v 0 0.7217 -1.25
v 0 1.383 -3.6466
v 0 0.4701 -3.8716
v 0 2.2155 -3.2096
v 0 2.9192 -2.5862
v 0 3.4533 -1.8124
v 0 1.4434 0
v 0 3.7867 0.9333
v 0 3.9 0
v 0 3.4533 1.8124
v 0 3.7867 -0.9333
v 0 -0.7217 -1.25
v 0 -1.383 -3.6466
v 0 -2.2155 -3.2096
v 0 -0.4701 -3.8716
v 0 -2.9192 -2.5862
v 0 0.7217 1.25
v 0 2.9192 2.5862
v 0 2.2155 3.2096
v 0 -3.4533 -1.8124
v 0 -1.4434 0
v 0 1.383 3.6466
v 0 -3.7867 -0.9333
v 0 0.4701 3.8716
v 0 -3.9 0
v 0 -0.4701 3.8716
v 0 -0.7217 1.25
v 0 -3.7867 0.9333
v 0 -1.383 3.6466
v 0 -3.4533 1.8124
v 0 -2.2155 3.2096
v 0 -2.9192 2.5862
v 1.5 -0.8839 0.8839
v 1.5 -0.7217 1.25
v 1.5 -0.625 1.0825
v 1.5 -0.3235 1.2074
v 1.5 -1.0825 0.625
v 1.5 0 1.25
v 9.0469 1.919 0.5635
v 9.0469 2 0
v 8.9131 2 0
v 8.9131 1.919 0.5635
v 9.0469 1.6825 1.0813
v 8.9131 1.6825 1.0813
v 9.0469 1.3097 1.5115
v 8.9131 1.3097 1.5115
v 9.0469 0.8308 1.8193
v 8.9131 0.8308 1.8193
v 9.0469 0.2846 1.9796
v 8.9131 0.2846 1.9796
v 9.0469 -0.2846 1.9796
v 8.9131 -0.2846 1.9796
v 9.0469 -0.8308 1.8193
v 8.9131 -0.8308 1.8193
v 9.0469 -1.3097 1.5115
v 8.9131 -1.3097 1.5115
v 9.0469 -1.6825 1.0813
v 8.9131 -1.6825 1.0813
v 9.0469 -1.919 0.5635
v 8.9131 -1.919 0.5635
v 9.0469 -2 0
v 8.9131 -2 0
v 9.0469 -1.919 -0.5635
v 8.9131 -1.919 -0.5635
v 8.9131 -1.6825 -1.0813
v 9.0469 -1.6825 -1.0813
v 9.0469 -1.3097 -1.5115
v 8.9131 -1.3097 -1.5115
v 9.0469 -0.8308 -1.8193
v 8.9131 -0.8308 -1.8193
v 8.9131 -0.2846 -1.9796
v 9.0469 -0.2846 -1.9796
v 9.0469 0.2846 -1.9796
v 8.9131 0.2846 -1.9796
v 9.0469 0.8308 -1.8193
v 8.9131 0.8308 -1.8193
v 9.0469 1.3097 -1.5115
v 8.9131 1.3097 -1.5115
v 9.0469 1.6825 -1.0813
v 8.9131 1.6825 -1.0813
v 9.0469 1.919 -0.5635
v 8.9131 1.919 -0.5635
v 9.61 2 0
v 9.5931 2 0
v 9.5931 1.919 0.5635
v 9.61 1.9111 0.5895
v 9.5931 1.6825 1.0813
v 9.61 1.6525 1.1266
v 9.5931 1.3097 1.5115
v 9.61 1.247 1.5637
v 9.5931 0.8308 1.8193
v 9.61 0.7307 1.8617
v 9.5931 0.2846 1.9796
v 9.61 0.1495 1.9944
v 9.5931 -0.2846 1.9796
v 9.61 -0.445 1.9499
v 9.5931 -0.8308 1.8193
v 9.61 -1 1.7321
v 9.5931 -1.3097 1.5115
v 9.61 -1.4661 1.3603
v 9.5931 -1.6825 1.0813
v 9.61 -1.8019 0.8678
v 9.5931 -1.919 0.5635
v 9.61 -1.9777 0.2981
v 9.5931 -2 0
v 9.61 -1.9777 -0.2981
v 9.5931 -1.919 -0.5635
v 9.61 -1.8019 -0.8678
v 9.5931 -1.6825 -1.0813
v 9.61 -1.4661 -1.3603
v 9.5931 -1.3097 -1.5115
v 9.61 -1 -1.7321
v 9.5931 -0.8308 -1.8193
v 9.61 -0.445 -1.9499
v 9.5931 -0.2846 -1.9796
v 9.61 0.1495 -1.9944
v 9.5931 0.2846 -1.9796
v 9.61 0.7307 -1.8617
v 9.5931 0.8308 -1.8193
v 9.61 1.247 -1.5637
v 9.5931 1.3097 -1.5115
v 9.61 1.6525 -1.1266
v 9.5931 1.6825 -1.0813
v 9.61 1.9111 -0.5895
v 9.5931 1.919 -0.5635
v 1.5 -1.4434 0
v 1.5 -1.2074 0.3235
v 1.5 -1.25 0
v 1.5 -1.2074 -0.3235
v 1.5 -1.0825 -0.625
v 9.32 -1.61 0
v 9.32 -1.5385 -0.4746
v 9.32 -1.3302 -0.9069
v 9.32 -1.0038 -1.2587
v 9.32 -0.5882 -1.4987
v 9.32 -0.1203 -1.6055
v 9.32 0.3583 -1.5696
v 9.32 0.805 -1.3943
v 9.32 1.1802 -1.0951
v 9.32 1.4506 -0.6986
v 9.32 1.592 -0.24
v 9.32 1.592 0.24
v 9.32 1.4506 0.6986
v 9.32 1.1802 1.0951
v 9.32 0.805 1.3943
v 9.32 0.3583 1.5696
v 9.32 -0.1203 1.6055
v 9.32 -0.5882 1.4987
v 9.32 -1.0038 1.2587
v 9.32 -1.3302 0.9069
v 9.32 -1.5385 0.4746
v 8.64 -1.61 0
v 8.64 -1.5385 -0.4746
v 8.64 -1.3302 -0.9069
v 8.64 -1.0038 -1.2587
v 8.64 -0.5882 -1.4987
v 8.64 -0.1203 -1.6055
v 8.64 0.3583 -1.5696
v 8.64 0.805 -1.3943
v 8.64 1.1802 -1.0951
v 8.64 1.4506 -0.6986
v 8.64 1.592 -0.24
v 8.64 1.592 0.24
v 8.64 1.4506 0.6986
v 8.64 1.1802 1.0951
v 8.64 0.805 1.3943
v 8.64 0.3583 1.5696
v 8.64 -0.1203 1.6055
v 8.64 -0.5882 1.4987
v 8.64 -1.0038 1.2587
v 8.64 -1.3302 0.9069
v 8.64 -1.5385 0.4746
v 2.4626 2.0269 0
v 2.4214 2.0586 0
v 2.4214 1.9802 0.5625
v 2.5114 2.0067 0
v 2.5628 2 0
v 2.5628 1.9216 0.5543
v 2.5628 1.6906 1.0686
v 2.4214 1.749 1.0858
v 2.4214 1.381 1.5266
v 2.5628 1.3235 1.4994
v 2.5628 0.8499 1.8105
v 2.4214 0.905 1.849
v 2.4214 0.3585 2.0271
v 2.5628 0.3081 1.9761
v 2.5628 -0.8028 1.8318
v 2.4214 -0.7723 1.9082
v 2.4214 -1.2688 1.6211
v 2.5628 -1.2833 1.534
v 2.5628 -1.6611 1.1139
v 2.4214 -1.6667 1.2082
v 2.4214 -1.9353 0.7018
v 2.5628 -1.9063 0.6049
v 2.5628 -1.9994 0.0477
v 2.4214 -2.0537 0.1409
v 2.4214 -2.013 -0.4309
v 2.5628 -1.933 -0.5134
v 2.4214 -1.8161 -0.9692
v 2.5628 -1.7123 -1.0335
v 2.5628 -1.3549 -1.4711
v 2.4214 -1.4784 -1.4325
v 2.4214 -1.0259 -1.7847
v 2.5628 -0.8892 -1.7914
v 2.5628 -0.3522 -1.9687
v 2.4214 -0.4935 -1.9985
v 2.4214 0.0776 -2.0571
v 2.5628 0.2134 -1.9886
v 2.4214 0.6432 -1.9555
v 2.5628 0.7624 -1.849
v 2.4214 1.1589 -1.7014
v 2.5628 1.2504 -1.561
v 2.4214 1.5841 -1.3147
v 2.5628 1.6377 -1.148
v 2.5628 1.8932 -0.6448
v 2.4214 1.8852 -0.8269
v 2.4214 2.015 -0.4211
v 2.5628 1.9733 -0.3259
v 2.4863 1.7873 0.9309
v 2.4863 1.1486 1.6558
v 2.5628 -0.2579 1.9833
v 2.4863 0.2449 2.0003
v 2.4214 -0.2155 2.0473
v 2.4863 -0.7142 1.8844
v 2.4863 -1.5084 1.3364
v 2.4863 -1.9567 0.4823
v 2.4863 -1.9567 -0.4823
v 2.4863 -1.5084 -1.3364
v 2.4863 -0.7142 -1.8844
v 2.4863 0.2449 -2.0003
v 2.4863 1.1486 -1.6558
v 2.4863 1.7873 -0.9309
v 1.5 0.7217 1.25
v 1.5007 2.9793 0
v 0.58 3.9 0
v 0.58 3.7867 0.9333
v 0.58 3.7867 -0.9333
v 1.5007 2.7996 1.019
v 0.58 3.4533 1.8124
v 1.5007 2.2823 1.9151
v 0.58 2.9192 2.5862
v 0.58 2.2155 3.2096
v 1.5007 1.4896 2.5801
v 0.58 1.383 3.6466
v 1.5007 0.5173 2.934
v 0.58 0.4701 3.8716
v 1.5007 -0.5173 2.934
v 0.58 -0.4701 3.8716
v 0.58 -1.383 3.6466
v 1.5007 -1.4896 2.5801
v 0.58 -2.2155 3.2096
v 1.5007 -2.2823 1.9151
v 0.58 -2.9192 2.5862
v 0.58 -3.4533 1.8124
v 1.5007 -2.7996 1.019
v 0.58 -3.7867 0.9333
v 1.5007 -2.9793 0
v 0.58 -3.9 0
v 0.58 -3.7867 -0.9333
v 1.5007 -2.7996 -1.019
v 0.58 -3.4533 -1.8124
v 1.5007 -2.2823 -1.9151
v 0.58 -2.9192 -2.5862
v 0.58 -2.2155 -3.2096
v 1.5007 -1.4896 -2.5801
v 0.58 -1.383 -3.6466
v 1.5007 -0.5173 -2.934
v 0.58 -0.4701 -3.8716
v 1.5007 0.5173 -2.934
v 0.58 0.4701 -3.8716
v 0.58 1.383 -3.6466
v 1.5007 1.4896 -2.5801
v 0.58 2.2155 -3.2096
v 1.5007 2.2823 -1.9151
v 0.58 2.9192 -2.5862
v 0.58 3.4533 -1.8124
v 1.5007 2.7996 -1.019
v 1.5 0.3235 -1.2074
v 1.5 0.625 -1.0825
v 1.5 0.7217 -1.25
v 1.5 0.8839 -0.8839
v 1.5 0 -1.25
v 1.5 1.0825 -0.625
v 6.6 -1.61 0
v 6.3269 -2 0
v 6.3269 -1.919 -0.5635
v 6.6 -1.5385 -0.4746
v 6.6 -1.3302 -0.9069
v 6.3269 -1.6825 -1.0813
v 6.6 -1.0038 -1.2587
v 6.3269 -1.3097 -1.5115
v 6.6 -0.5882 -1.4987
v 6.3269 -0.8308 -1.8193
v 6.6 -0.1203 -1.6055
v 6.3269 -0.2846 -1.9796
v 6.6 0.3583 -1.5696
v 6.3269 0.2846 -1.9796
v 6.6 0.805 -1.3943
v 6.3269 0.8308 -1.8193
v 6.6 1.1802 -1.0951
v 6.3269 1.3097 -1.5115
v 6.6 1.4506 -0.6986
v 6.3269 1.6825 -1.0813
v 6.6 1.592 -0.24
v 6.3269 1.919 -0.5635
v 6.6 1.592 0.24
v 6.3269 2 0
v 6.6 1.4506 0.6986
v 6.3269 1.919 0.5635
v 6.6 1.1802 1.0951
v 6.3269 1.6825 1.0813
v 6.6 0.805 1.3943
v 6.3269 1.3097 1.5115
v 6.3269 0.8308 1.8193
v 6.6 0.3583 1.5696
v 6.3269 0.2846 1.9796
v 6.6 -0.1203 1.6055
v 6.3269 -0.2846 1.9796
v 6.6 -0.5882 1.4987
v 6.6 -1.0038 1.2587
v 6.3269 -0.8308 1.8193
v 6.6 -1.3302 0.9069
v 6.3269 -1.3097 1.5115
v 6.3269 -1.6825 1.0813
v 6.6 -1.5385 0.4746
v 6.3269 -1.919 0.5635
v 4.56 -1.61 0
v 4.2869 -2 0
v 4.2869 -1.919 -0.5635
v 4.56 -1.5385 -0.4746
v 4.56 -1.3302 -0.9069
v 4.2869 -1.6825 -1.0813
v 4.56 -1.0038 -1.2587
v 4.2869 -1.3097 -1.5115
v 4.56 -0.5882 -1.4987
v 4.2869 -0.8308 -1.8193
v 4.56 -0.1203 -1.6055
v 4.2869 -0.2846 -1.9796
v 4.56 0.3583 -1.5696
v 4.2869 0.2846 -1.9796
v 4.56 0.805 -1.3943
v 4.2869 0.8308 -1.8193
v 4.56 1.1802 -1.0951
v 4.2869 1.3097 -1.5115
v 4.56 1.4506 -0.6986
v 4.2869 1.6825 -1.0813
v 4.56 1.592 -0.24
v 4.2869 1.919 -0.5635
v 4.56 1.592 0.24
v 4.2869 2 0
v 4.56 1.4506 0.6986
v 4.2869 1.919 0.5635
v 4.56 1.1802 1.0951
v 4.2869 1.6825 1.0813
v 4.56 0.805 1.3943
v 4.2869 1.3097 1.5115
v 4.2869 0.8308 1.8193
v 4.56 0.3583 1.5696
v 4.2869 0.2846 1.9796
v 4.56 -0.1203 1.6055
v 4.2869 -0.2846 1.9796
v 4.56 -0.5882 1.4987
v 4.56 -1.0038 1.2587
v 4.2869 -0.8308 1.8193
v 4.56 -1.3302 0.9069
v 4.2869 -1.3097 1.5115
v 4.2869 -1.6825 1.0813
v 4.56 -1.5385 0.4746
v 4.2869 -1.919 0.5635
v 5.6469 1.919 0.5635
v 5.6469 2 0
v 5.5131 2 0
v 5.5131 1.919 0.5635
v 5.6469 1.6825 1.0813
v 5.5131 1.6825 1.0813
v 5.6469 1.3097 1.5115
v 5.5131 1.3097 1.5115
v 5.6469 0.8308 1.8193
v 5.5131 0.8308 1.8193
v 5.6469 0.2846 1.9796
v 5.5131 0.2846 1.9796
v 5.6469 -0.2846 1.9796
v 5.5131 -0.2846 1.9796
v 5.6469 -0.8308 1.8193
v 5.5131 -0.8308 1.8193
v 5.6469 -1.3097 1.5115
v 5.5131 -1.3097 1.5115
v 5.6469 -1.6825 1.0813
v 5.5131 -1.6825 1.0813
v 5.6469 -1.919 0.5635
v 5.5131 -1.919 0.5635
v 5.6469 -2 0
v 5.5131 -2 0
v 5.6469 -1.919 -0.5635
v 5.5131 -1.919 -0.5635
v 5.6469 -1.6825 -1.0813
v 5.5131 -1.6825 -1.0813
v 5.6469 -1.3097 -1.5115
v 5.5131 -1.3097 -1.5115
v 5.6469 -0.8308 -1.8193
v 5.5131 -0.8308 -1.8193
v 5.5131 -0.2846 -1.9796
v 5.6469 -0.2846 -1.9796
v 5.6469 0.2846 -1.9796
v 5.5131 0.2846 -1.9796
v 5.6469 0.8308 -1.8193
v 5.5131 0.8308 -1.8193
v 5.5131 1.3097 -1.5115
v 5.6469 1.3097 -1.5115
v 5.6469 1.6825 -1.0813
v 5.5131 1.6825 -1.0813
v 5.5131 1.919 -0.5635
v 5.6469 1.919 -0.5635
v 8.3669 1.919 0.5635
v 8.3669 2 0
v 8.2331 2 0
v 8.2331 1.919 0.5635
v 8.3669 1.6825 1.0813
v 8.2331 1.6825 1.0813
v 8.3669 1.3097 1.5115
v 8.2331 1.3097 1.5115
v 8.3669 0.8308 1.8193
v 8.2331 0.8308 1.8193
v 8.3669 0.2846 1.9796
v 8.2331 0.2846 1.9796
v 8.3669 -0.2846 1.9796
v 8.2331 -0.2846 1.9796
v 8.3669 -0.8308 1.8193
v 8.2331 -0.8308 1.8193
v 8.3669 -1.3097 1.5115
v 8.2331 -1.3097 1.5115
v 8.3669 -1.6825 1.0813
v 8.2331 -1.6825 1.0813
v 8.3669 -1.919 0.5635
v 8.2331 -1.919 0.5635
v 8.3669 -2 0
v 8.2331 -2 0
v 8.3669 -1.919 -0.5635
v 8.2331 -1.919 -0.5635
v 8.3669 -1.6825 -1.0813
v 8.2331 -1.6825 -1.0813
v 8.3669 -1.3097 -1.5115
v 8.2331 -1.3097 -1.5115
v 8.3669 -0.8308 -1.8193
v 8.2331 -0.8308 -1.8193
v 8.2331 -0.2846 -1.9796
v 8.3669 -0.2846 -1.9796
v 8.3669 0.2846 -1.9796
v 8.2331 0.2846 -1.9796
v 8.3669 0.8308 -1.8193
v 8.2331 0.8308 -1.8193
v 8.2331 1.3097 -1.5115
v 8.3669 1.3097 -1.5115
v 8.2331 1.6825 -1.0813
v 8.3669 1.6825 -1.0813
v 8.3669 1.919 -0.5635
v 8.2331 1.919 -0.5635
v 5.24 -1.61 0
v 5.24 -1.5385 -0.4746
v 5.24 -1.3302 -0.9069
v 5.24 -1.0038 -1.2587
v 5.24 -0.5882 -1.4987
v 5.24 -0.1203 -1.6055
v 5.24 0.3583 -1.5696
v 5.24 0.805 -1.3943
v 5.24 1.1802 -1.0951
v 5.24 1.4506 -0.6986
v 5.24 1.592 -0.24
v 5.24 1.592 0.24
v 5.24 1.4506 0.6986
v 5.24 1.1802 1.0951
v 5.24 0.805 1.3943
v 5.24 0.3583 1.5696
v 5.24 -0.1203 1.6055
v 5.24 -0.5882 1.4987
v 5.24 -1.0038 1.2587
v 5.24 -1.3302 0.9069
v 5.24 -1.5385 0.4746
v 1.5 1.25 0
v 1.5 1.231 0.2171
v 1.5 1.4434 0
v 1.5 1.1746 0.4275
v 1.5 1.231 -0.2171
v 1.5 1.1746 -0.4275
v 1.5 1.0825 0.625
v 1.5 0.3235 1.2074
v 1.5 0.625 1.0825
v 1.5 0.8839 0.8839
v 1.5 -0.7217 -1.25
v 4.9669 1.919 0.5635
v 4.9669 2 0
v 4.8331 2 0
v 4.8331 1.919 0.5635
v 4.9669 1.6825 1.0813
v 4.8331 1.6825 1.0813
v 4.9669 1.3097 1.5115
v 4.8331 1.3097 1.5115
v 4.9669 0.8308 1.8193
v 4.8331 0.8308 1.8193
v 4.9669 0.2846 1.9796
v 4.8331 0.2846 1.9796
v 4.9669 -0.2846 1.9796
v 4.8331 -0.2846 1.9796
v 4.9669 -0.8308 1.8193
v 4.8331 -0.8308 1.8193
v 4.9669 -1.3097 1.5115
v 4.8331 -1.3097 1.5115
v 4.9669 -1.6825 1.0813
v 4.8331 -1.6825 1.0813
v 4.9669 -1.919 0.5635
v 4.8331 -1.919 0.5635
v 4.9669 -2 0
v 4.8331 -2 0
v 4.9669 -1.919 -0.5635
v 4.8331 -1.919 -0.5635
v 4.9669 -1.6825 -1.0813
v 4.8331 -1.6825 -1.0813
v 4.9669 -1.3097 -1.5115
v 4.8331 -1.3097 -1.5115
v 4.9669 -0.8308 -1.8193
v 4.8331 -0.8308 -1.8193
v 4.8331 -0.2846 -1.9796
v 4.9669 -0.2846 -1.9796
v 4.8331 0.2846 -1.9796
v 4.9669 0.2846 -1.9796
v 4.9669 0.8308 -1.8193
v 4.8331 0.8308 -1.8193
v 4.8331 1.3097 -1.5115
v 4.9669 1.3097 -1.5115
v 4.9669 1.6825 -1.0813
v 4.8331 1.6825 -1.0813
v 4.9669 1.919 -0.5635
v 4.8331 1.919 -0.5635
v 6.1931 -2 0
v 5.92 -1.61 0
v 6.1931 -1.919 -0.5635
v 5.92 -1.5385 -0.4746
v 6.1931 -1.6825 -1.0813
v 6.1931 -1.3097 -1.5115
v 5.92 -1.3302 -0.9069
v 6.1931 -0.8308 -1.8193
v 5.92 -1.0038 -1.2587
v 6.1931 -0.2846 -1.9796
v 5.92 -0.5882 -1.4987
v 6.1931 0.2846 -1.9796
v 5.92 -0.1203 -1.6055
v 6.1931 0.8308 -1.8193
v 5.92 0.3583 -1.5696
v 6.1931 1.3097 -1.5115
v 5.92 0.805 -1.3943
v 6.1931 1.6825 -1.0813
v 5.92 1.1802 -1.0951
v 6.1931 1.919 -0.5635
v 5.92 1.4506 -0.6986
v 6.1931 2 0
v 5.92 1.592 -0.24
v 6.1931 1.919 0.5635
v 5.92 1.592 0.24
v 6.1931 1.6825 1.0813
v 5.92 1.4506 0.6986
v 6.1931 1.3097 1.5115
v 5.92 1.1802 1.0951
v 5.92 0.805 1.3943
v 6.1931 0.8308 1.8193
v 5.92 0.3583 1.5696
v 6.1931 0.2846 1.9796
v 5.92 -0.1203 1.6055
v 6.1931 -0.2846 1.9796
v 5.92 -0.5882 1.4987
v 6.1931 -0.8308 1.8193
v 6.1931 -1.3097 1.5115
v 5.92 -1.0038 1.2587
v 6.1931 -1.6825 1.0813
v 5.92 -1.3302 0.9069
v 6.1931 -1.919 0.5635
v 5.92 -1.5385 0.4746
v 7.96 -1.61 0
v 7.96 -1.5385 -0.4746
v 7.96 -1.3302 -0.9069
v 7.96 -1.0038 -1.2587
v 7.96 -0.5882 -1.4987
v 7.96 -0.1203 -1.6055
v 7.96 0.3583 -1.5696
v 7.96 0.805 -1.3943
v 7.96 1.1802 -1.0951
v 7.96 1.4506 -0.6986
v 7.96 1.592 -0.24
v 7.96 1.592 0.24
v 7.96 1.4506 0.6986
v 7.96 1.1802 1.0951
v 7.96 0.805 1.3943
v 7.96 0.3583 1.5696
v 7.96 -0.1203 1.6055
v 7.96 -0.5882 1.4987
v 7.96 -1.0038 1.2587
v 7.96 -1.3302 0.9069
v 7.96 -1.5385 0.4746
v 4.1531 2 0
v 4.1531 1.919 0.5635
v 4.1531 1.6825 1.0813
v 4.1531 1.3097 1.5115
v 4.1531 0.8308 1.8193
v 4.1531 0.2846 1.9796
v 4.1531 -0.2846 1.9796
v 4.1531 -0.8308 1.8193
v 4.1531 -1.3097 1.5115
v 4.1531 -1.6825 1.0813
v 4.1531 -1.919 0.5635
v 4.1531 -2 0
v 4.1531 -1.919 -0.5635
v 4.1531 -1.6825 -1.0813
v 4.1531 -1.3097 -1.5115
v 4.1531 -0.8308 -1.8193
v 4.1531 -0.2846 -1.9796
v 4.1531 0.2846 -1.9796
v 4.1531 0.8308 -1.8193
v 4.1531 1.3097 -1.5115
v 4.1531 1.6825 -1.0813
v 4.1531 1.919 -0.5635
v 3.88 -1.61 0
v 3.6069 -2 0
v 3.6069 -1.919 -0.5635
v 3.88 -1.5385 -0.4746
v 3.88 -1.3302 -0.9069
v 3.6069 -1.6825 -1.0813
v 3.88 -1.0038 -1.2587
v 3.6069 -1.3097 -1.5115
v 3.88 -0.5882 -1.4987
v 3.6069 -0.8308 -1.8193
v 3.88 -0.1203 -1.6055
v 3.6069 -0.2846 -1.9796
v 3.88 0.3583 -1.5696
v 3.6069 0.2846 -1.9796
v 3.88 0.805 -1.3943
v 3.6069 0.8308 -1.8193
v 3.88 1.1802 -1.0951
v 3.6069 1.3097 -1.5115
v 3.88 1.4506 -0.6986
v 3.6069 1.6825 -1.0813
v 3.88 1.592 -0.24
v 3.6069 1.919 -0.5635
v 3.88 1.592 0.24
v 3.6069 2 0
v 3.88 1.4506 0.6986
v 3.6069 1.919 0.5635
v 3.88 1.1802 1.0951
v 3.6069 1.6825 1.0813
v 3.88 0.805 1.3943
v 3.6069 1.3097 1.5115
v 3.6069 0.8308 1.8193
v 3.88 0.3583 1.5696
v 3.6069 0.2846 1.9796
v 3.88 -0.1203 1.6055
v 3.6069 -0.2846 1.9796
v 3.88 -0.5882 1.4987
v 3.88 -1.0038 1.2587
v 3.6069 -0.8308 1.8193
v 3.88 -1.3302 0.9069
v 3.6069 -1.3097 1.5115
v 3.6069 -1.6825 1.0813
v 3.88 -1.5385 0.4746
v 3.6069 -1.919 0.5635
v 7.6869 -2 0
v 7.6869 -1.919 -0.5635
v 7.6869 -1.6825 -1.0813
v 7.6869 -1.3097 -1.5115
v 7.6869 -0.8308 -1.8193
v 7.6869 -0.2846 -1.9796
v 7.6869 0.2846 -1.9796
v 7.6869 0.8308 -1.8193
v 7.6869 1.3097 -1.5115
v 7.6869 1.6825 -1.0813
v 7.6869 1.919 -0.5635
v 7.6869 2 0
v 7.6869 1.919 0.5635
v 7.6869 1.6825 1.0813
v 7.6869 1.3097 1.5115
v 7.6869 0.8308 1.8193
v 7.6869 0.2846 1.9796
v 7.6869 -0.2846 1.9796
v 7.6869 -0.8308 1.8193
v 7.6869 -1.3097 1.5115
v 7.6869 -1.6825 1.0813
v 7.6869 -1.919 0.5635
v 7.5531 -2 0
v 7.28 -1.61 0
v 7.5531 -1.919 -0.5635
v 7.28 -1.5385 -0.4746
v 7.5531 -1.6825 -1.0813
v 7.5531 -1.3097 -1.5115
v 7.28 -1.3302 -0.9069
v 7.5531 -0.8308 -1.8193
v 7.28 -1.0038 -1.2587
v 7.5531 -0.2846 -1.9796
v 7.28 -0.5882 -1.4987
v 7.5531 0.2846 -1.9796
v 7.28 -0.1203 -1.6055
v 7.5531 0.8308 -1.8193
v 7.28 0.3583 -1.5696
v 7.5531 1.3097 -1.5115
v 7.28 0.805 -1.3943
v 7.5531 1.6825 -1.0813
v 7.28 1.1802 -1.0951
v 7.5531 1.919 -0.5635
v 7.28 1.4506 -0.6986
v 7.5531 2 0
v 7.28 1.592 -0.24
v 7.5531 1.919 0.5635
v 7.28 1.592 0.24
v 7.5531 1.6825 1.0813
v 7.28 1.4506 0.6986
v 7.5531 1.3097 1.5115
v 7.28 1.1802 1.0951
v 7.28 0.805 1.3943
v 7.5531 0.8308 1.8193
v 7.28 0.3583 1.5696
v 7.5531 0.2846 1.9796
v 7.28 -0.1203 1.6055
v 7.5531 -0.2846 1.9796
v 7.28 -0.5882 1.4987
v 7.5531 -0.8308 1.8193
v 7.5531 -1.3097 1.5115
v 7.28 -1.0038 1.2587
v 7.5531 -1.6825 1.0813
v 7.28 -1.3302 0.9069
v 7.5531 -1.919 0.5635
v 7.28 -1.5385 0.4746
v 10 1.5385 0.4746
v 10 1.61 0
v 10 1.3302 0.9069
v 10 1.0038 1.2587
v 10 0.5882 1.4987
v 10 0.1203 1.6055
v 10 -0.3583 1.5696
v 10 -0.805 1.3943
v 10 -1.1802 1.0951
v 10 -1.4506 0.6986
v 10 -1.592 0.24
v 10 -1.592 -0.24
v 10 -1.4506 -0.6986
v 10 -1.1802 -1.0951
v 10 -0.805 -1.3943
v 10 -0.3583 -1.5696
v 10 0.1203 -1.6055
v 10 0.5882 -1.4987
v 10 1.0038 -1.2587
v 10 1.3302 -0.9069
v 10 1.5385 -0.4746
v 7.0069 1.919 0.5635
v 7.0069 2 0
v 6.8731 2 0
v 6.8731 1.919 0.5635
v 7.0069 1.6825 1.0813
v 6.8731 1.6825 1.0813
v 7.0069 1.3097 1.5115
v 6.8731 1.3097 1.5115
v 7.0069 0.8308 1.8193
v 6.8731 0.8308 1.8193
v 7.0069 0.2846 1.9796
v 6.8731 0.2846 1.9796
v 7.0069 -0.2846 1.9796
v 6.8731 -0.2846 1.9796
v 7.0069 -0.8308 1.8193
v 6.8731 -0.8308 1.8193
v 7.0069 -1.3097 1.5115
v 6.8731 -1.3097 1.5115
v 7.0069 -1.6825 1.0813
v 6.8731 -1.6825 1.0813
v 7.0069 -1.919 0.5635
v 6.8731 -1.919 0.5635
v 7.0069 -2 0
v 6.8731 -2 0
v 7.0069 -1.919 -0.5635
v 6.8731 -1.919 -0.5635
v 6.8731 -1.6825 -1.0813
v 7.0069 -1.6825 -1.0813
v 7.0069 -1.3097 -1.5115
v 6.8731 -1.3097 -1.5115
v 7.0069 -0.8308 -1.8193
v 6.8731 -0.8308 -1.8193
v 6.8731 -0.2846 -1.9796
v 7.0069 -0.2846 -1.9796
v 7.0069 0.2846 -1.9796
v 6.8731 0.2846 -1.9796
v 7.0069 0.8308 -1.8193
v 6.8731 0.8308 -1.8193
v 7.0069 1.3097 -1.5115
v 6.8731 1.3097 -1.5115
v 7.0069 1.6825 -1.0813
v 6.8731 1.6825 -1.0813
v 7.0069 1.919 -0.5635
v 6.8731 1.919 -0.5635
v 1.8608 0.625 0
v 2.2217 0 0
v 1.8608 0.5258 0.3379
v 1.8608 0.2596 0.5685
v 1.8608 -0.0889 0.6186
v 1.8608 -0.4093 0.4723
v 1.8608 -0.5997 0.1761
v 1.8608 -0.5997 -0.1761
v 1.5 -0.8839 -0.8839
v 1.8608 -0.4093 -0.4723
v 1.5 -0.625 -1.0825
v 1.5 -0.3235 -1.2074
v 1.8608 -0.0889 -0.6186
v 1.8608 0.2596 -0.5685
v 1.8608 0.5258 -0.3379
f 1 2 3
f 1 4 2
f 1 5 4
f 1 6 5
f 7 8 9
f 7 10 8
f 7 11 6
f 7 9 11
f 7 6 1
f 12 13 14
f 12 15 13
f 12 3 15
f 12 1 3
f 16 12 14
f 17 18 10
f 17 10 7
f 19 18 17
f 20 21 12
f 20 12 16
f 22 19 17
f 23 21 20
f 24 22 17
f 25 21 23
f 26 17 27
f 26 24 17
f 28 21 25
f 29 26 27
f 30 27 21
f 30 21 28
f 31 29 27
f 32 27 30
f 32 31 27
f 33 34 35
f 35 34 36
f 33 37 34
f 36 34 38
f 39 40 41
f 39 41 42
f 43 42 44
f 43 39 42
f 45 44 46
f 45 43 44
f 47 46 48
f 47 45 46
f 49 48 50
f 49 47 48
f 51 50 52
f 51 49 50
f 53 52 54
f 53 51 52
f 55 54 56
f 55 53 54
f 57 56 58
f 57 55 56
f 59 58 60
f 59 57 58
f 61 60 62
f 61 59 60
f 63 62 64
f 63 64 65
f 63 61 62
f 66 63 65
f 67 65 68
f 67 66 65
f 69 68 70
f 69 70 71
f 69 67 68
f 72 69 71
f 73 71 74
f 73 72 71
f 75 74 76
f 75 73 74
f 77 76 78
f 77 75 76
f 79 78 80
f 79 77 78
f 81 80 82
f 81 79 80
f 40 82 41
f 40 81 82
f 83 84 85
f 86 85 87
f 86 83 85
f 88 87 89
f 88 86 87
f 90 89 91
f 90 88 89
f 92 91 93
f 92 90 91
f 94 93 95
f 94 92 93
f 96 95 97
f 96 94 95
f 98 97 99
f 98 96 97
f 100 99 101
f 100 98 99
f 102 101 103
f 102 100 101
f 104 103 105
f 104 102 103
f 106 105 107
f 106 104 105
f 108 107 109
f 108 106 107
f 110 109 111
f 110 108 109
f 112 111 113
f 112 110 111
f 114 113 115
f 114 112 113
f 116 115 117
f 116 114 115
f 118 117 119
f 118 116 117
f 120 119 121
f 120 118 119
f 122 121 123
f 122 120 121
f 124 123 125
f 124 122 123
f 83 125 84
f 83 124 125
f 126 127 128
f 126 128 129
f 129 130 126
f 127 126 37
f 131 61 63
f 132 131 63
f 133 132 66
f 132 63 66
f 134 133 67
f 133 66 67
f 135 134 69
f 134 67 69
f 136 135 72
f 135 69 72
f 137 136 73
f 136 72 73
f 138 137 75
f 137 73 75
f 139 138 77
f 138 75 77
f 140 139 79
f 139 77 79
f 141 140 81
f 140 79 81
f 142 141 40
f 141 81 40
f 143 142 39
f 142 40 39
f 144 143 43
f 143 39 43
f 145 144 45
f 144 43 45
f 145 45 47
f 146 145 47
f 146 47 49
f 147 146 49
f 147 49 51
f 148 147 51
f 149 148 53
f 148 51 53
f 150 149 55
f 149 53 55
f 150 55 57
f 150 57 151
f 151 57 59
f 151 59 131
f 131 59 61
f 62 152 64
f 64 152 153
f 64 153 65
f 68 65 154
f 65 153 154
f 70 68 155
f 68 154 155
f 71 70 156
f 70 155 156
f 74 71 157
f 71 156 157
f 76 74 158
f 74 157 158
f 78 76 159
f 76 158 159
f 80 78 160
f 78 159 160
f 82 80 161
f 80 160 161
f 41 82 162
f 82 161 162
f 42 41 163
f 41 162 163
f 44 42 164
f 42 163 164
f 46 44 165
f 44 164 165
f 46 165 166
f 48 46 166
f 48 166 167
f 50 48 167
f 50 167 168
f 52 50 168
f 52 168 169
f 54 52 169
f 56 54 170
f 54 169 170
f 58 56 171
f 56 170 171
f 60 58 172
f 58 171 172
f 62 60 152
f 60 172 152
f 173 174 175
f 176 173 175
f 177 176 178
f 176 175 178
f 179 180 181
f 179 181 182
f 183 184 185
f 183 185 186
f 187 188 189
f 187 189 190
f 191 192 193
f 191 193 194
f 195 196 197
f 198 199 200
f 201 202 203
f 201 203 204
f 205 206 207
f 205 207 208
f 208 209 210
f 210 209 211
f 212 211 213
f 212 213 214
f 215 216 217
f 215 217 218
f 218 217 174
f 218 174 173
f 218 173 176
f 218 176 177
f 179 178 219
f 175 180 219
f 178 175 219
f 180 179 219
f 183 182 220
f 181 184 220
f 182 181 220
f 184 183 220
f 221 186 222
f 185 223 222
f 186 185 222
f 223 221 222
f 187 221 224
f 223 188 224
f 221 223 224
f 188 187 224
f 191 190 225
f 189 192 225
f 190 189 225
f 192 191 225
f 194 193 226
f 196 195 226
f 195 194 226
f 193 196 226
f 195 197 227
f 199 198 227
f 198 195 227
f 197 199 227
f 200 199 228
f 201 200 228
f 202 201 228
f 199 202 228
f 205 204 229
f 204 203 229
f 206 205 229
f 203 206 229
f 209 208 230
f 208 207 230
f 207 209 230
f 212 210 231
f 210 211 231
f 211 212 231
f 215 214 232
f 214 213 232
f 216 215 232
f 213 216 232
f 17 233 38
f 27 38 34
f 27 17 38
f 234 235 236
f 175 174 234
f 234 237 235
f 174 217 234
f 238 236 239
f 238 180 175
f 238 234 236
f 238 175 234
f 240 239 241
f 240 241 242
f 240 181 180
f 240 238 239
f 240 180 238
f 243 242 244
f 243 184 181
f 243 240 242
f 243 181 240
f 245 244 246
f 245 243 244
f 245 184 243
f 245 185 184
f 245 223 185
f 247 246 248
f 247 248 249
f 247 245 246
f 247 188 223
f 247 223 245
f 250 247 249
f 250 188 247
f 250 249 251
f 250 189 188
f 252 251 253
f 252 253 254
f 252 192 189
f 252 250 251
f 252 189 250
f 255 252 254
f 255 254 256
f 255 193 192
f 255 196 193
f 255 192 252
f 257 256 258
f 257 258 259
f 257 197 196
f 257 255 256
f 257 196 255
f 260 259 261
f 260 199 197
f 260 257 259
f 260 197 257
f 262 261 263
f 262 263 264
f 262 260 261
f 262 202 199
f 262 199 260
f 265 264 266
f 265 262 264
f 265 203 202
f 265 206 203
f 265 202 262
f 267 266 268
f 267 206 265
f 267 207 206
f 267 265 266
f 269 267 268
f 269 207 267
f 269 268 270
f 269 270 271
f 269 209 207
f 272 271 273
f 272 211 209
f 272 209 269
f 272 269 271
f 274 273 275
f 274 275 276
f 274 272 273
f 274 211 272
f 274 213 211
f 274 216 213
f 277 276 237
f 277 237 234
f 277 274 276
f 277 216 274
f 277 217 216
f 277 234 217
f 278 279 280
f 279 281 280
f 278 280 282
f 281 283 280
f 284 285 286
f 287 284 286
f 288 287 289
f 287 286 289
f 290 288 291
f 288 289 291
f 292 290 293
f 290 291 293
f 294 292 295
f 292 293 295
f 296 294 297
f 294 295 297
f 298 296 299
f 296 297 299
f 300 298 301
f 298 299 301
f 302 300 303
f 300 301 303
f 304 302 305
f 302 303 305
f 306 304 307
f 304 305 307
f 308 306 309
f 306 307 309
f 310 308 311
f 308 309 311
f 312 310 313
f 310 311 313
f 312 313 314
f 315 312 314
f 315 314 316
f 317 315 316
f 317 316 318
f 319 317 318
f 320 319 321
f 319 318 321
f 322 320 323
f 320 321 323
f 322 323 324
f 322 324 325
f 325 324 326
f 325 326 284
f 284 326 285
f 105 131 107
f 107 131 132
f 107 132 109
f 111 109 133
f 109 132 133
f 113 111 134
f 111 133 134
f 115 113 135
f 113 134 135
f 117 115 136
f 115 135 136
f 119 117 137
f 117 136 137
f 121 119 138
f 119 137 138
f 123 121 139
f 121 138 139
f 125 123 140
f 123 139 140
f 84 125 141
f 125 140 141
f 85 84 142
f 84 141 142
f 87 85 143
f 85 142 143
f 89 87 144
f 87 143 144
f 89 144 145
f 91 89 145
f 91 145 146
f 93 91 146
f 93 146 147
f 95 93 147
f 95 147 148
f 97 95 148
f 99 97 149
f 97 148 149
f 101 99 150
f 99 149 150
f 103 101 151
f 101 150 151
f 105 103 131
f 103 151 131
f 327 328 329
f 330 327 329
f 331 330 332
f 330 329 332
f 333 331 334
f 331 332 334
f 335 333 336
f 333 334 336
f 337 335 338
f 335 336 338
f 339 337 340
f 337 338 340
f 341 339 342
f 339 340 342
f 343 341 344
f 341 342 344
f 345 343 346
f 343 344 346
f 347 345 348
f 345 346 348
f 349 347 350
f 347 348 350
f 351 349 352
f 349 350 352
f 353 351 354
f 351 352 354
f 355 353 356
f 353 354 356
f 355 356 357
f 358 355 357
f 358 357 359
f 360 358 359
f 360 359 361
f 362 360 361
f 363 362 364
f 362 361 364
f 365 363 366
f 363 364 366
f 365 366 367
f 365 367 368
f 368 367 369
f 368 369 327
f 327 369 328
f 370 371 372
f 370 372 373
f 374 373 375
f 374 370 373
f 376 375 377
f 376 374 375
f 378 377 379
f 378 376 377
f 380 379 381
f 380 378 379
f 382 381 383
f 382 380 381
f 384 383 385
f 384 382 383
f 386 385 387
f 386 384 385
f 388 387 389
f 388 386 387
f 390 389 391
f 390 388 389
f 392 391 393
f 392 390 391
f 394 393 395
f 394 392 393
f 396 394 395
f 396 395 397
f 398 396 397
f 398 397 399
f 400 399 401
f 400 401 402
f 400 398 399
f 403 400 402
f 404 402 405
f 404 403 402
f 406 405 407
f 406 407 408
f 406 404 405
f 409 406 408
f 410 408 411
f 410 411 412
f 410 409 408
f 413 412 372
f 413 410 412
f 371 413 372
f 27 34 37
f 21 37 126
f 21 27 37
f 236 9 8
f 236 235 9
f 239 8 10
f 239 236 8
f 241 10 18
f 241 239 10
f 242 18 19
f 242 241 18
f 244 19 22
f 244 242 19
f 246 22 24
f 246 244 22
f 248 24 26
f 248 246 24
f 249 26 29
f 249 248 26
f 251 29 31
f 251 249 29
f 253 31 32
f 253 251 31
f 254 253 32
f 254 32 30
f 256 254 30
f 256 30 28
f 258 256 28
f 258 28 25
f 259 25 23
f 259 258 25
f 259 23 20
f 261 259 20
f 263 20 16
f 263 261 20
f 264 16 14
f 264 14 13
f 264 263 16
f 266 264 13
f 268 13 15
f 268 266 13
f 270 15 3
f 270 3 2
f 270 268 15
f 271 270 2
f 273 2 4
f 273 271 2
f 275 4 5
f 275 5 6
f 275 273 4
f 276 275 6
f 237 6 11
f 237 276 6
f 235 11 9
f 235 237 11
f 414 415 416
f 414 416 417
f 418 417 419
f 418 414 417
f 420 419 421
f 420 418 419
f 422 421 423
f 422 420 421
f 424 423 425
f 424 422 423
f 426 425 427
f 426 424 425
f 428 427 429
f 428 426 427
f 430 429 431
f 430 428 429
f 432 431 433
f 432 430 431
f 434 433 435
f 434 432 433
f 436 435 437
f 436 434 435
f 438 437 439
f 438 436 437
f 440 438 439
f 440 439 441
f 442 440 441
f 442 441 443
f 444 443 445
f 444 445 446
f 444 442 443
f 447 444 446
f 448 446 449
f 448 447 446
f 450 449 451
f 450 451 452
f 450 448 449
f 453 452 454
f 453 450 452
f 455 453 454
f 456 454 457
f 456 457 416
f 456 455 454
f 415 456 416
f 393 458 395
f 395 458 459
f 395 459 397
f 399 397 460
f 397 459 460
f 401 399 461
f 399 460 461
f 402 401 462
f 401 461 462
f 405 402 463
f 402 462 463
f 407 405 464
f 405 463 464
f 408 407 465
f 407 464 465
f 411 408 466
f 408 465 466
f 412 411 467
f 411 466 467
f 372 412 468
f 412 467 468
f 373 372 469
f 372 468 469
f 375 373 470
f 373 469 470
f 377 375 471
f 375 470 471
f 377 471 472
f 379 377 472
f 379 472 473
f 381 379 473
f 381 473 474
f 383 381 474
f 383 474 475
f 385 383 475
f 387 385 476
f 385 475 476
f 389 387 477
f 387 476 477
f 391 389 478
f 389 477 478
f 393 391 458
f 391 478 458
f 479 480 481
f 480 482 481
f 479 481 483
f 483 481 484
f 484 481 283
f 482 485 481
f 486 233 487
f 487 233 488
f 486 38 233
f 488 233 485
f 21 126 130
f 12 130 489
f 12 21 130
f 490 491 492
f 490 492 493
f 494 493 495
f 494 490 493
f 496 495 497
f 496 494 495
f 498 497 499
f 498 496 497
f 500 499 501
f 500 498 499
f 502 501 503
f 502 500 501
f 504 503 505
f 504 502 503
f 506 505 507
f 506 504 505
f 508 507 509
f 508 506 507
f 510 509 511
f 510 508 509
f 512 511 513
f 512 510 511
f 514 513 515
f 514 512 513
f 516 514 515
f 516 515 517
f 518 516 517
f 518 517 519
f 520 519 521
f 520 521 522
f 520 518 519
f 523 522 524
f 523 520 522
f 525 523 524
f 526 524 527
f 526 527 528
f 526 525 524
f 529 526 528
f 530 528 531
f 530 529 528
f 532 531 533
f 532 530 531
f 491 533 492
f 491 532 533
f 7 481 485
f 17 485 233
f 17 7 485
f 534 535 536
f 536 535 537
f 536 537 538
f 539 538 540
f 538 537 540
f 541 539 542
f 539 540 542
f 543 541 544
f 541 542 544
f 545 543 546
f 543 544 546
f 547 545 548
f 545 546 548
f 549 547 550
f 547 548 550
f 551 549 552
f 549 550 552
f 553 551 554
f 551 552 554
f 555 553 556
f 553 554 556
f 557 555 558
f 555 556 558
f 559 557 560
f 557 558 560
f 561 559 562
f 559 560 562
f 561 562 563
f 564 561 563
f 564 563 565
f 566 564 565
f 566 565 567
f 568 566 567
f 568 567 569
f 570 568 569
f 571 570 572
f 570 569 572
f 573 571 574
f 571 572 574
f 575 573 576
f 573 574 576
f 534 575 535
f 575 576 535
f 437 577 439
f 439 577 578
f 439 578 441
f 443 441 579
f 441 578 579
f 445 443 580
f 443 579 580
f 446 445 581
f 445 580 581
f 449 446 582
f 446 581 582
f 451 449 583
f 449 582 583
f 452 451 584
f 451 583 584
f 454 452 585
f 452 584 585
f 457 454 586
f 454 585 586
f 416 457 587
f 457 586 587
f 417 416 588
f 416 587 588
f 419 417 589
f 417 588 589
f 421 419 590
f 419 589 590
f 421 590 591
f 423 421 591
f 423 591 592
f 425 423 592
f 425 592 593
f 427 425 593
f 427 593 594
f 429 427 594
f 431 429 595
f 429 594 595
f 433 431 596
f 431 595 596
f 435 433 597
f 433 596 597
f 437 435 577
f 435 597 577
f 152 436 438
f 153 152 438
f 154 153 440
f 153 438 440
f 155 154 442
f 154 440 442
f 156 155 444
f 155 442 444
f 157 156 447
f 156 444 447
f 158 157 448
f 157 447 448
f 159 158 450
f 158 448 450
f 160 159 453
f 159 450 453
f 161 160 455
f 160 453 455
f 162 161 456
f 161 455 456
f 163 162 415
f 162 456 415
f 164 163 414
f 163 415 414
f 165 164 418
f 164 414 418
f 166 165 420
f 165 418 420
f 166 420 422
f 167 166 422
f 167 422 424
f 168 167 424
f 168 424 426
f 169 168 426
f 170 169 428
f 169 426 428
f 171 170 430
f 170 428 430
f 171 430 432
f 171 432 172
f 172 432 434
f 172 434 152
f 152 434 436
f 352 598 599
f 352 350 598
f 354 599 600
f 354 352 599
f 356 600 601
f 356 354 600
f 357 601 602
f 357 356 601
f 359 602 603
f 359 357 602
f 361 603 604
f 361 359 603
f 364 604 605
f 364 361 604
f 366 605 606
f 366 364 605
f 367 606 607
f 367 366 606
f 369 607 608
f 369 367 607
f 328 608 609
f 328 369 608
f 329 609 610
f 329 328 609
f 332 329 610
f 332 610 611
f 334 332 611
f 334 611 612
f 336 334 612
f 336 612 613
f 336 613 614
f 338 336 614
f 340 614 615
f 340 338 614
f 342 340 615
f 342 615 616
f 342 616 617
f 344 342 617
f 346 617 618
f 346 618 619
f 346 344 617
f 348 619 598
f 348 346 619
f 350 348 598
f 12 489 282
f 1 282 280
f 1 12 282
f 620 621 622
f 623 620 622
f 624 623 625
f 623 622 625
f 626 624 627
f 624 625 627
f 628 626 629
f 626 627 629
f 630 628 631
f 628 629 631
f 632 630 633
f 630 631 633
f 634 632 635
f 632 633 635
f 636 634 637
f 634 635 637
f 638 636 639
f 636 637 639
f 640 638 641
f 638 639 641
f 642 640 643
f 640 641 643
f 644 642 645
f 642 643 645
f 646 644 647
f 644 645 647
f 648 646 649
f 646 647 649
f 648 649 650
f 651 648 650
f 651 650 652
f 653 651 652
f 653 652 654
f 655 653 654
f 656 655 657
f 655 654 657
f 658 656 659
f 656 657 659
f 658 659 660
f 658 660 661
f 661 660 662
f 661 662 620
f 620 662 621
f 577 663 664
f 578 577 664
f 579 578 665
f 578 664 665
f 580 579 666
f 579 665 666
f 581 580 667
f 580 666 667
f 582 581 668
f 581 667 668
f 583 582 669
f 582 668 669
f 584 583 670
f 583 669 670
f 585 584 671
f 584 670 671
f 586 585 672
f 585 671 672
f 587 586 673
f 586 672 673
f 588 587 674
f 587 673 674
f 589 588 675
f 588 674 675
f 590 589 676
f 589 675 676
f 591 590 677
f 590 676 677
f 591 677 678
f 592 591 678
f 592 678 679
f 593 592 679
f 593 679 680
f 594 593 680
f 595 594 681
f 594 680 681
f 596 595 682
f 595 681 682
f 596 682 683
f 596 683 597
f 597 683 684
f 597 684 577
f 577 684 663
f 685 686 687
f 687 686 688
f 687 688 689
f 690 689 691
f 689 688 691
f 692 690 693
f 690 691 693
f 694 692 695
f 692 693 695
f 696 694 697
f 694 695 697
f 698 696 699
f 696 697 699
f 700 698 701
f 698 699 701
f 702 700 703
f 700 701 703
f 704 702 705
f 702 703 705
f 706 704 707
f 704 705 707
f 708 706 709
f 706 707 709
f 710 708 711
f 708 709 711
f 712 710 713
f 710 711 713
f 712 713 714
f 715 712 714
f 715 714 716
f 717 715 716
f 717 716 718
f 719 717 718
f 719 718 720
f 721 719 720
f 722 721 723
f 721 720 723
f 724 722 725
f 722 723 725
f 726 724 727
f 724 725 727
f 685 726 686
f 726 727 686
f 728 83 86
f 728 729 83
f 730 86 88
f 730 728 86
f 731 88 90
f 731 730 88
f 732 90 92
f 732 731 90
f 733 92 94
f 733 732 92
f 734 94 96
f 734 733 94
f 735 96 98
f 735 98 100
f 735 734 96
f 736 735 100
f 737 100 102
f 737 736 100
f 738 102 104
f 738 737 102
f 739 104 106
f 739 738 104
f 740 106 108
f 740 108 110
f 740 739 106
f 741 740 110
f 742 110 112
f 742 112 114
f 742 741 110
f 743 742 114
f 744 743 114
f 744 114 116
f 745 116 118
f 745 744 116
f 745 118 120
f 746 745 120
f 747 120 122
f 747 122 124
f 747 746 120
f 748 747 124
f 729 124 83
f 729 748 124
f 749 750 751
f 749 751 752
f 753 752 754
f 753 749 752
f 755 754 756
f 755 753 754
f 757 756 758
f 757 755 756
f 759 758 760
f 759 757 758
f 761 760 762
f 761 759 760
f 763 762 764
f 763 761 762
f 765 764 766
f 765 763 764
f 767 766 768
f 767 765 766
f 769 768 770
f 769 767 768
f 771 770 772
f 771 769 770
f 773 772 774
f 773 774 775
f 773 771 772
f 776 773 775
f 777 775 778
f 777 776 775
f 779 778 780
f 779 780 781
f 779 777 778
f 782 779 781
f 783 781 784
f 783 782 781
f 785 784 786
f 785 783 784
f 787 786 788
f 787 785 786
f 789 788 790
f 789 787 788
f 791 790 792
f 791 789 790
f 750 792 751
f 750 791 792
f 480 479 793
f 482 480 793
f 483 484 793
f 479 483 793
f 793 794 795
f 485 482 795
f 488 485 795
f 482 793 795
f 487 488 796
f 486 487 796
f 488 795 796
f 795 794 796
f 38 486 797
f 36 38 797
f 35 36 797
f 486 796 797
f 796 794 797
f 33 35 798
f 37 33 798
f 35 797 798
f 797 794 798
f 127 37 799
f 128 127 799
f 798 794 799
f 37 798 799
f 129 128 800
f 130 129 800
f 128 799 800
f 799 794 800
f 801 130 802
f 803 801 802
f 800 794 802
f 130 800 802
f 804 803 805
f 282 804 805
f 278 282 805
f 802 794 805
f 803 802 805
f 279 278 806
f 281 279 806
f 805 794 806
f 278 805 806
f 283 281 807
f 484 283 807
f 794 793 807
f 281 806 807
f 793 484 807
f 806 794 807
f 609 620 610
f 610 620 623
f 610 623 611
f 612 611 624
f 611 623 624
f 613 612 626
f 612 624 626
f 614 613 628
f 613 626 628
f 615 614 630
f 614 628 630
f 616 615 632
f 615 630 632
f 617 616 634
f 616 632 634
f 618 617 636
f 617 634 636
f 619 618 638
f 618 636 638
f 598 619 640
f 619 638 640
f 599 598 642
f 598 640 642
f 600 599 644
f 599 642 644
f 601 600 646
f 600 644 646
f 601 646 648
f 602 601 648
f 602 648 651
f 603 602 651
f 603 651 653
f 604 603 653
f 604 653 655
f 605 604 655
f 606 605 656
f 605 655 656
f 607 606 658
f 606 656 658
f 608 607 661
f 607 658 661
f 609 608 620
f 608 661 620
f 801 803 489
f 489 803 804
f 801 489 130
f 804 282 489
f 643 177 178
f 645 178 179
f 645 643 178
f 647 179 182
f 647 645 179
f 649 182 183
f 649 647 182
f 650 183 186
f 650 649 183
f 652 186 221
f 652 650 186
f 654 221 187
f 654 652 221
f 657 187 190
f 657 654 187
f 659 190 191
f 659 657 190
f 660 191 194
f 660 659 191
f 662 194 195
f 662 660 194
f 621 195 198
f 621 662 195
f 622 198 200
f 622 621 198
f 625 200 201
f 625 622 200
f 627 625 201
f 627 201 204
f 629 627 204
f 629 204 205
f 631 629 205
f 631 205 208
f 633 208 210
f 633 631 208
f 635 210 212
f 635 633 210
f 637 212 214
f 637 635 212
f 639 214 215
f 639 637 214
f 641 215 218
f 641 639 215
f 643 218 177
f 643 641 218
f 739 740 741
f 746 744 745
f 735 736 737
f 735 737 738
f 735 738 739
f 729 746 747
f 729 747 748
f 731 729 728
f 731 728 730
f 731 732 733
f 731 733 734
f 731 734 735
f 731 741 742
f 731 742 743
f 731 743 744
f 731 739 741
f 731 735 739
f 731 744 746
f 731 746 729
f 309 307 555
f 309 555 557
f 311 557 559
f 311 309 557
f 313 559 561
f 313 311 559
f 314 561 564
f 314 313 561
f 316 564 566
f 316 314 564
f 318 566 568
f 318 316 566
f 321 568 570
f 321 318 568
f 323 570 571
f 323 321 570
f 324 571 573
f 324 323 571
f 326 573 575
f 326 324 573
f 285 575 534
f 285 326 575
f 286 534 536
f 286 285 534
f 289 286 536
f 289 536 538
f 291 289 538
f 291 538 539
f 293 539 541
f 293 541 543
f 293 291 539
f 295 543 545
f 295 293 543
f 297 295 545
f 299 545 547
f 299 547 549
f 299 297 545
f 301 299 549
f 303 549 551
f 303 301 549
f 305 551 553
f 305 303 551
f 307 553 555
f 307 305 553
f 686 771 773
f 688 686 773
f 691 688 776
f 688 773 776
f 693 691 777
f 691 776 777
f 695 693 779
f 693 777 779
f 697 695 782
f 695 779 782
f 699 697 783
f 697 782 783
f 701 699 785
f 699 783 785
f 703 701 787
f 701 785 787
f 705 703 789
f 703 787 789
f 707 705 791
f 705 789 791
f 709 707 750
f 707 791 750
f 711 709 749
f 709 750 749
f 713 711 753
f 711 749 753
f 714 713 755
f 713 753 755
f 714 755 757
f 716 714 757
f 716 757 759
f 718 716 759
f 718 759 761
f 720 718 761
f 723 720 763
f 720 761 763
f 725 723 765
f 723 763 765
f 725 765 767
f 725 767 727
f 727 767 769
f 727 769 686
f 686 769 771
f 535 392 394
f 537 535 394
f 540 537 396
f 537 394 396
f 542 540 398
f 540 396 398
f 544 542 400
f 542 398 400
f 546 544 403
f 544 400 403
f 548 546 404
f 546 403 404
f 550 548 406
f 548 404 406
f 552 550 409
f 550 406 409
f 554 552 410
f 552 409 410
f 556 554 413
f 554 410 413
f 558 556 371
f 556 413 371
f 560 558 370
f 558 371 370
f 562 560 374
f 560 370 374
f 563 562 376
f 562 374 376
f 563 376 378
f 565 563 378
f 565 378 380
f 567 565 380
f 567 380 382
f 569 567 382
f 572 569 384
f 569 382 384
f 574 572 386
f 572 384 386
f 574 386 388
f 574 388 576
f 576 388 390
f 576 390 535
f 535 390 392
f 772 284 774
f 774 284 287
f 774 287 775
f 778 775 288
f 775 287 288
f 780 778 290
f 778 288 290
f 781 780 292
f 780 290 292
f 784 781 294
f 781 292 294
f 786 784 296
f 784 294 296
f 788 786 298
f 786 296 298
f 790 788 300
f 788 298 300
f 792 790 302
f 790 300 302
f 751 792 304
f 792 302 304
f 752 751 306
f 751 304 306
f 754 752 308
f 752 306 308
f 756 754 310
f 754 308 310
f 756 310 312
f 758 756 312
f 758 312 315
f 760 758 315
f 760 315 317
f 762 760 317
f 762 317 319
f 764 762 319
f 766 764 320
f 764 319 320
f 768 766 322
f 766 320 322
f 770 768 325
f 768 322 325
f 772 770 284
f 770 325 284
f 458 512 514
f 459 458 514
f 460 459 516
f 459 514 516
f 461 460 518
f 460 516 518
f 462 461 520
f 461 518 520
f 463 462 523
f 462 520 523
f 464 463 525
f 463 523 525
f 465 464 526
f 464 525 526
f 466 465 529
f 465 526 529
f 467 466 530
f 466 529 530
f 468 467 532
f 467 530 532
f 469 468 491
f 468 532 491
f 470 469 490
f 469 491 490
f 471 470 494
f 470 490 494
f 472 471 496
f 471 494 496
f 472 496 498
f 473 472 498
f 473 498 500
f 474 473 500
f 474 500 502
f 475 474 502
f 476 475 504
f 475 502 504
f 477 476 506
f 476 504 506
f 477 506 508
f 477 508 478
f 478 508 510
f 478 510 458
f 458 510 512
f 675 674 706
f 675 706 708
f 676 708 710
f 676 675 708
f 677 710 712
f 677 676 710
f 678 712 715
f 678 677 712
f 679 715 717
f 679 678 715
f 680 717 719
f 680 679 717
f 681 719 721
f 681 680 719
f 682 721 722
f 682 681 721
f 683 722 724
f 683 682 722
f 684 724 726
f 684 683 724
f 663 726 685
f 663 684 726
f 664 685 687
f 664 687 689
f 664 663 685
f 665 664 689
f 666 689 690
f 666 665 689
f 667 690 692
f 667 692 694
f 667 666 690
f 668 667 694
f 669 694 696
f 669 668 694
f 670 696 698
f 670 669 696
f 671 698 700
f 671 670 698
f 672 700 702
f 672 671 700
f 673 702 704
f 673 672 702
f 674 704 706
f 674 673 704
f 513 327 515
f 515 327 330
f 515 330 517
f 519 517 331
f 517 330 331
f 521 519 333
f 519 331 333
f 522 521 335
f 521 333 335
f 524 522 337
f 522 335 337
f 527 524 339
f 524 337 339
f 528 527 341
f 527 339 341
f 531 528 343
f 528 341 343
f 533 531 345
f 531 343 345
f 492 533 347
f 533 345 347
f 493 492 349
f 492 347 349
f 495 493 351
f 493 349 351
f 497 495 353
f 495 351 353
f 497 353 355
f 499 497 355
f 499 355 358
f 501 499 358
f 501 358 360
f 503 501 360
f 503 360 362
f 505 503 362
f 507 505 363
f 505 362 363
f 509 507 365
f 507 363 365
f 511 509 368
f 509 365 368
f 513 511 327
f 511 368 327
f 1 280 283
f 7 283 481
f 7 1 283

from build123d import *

# Parameters (mm, degrees)
FILLET1_R       = 0.2
HEX_2_DEPTH     = 1.5
THDSCHPAT_COUNT = 9
THDSCHPAT_PITCH = 0.68


with BuildPart() as part:
    # BodySke → BaseBody (revolve)
    with BuildSketch(Plane.XY):
        Polygon((0, 0), (0, 3.9), (0.58, 3.9), (2.48, 2), (9.61, 2), (10, 1.61), (10, 0), align=None)
    revolve(axis=Axis((0, 0, 0), (1, 0, 0)))

    # Fillet1
    fillet1_edges = [part.edges().sort_by_distance(p)[0] for p in [
        (2.48, -2, 0),
    ]]
    fillet(fillet1_edges, radius=FILLET1_R)

    # Sketch2 → PreBroach (revolve, cut)
    with BuildSketch(Plane.XY):
        Polygon((0, 1.25), (1.5, 1.25), (2.221687836, 0), (0, 0), align=None)
    revolve(axis=Axis((0, 0, 0), (1, 0, 0)), mode=Mode.SUBTRACT)

    # Sketch3 → Hex 2 (cut)
    with BuildSketch(Plane.ZY):
        Polygon((-1.25, -0.721687836), (-1.25, 0.721687836), (0, 1.443375673), (1.25, 0.721687836), (1.25, -0.721687836), (0, -1.443375673), align=None)
    extrude(amount=-HEX_2_DEPTH, mode=Mode.SUBTRACT)

    # ThdSchSke → ThreadSchematic (revolve, cut)
    with BuildSketch(Plane.XY):
        Polygon((3.880001, -1.61), (3.60692006, -2), (3.60692006, -2.5), (4.15308194, -2.5), (4.15308194, -2), align=None)
    threadschematic = revolve(axis=Axis((-3.175, 0, 0), (1, 0, 0)), mode=Mode.SUBTRACT)

    # ThdSchPat: ThreadSchematic ×9
    with Locations(*[(i * THDSCHPAT_PITCH, 0, 0) for i in range(1, THDSCHPAT_COUNT)]):
        add(threadschematic, mode=Mode.SUBTRACT)


solid = part.part
